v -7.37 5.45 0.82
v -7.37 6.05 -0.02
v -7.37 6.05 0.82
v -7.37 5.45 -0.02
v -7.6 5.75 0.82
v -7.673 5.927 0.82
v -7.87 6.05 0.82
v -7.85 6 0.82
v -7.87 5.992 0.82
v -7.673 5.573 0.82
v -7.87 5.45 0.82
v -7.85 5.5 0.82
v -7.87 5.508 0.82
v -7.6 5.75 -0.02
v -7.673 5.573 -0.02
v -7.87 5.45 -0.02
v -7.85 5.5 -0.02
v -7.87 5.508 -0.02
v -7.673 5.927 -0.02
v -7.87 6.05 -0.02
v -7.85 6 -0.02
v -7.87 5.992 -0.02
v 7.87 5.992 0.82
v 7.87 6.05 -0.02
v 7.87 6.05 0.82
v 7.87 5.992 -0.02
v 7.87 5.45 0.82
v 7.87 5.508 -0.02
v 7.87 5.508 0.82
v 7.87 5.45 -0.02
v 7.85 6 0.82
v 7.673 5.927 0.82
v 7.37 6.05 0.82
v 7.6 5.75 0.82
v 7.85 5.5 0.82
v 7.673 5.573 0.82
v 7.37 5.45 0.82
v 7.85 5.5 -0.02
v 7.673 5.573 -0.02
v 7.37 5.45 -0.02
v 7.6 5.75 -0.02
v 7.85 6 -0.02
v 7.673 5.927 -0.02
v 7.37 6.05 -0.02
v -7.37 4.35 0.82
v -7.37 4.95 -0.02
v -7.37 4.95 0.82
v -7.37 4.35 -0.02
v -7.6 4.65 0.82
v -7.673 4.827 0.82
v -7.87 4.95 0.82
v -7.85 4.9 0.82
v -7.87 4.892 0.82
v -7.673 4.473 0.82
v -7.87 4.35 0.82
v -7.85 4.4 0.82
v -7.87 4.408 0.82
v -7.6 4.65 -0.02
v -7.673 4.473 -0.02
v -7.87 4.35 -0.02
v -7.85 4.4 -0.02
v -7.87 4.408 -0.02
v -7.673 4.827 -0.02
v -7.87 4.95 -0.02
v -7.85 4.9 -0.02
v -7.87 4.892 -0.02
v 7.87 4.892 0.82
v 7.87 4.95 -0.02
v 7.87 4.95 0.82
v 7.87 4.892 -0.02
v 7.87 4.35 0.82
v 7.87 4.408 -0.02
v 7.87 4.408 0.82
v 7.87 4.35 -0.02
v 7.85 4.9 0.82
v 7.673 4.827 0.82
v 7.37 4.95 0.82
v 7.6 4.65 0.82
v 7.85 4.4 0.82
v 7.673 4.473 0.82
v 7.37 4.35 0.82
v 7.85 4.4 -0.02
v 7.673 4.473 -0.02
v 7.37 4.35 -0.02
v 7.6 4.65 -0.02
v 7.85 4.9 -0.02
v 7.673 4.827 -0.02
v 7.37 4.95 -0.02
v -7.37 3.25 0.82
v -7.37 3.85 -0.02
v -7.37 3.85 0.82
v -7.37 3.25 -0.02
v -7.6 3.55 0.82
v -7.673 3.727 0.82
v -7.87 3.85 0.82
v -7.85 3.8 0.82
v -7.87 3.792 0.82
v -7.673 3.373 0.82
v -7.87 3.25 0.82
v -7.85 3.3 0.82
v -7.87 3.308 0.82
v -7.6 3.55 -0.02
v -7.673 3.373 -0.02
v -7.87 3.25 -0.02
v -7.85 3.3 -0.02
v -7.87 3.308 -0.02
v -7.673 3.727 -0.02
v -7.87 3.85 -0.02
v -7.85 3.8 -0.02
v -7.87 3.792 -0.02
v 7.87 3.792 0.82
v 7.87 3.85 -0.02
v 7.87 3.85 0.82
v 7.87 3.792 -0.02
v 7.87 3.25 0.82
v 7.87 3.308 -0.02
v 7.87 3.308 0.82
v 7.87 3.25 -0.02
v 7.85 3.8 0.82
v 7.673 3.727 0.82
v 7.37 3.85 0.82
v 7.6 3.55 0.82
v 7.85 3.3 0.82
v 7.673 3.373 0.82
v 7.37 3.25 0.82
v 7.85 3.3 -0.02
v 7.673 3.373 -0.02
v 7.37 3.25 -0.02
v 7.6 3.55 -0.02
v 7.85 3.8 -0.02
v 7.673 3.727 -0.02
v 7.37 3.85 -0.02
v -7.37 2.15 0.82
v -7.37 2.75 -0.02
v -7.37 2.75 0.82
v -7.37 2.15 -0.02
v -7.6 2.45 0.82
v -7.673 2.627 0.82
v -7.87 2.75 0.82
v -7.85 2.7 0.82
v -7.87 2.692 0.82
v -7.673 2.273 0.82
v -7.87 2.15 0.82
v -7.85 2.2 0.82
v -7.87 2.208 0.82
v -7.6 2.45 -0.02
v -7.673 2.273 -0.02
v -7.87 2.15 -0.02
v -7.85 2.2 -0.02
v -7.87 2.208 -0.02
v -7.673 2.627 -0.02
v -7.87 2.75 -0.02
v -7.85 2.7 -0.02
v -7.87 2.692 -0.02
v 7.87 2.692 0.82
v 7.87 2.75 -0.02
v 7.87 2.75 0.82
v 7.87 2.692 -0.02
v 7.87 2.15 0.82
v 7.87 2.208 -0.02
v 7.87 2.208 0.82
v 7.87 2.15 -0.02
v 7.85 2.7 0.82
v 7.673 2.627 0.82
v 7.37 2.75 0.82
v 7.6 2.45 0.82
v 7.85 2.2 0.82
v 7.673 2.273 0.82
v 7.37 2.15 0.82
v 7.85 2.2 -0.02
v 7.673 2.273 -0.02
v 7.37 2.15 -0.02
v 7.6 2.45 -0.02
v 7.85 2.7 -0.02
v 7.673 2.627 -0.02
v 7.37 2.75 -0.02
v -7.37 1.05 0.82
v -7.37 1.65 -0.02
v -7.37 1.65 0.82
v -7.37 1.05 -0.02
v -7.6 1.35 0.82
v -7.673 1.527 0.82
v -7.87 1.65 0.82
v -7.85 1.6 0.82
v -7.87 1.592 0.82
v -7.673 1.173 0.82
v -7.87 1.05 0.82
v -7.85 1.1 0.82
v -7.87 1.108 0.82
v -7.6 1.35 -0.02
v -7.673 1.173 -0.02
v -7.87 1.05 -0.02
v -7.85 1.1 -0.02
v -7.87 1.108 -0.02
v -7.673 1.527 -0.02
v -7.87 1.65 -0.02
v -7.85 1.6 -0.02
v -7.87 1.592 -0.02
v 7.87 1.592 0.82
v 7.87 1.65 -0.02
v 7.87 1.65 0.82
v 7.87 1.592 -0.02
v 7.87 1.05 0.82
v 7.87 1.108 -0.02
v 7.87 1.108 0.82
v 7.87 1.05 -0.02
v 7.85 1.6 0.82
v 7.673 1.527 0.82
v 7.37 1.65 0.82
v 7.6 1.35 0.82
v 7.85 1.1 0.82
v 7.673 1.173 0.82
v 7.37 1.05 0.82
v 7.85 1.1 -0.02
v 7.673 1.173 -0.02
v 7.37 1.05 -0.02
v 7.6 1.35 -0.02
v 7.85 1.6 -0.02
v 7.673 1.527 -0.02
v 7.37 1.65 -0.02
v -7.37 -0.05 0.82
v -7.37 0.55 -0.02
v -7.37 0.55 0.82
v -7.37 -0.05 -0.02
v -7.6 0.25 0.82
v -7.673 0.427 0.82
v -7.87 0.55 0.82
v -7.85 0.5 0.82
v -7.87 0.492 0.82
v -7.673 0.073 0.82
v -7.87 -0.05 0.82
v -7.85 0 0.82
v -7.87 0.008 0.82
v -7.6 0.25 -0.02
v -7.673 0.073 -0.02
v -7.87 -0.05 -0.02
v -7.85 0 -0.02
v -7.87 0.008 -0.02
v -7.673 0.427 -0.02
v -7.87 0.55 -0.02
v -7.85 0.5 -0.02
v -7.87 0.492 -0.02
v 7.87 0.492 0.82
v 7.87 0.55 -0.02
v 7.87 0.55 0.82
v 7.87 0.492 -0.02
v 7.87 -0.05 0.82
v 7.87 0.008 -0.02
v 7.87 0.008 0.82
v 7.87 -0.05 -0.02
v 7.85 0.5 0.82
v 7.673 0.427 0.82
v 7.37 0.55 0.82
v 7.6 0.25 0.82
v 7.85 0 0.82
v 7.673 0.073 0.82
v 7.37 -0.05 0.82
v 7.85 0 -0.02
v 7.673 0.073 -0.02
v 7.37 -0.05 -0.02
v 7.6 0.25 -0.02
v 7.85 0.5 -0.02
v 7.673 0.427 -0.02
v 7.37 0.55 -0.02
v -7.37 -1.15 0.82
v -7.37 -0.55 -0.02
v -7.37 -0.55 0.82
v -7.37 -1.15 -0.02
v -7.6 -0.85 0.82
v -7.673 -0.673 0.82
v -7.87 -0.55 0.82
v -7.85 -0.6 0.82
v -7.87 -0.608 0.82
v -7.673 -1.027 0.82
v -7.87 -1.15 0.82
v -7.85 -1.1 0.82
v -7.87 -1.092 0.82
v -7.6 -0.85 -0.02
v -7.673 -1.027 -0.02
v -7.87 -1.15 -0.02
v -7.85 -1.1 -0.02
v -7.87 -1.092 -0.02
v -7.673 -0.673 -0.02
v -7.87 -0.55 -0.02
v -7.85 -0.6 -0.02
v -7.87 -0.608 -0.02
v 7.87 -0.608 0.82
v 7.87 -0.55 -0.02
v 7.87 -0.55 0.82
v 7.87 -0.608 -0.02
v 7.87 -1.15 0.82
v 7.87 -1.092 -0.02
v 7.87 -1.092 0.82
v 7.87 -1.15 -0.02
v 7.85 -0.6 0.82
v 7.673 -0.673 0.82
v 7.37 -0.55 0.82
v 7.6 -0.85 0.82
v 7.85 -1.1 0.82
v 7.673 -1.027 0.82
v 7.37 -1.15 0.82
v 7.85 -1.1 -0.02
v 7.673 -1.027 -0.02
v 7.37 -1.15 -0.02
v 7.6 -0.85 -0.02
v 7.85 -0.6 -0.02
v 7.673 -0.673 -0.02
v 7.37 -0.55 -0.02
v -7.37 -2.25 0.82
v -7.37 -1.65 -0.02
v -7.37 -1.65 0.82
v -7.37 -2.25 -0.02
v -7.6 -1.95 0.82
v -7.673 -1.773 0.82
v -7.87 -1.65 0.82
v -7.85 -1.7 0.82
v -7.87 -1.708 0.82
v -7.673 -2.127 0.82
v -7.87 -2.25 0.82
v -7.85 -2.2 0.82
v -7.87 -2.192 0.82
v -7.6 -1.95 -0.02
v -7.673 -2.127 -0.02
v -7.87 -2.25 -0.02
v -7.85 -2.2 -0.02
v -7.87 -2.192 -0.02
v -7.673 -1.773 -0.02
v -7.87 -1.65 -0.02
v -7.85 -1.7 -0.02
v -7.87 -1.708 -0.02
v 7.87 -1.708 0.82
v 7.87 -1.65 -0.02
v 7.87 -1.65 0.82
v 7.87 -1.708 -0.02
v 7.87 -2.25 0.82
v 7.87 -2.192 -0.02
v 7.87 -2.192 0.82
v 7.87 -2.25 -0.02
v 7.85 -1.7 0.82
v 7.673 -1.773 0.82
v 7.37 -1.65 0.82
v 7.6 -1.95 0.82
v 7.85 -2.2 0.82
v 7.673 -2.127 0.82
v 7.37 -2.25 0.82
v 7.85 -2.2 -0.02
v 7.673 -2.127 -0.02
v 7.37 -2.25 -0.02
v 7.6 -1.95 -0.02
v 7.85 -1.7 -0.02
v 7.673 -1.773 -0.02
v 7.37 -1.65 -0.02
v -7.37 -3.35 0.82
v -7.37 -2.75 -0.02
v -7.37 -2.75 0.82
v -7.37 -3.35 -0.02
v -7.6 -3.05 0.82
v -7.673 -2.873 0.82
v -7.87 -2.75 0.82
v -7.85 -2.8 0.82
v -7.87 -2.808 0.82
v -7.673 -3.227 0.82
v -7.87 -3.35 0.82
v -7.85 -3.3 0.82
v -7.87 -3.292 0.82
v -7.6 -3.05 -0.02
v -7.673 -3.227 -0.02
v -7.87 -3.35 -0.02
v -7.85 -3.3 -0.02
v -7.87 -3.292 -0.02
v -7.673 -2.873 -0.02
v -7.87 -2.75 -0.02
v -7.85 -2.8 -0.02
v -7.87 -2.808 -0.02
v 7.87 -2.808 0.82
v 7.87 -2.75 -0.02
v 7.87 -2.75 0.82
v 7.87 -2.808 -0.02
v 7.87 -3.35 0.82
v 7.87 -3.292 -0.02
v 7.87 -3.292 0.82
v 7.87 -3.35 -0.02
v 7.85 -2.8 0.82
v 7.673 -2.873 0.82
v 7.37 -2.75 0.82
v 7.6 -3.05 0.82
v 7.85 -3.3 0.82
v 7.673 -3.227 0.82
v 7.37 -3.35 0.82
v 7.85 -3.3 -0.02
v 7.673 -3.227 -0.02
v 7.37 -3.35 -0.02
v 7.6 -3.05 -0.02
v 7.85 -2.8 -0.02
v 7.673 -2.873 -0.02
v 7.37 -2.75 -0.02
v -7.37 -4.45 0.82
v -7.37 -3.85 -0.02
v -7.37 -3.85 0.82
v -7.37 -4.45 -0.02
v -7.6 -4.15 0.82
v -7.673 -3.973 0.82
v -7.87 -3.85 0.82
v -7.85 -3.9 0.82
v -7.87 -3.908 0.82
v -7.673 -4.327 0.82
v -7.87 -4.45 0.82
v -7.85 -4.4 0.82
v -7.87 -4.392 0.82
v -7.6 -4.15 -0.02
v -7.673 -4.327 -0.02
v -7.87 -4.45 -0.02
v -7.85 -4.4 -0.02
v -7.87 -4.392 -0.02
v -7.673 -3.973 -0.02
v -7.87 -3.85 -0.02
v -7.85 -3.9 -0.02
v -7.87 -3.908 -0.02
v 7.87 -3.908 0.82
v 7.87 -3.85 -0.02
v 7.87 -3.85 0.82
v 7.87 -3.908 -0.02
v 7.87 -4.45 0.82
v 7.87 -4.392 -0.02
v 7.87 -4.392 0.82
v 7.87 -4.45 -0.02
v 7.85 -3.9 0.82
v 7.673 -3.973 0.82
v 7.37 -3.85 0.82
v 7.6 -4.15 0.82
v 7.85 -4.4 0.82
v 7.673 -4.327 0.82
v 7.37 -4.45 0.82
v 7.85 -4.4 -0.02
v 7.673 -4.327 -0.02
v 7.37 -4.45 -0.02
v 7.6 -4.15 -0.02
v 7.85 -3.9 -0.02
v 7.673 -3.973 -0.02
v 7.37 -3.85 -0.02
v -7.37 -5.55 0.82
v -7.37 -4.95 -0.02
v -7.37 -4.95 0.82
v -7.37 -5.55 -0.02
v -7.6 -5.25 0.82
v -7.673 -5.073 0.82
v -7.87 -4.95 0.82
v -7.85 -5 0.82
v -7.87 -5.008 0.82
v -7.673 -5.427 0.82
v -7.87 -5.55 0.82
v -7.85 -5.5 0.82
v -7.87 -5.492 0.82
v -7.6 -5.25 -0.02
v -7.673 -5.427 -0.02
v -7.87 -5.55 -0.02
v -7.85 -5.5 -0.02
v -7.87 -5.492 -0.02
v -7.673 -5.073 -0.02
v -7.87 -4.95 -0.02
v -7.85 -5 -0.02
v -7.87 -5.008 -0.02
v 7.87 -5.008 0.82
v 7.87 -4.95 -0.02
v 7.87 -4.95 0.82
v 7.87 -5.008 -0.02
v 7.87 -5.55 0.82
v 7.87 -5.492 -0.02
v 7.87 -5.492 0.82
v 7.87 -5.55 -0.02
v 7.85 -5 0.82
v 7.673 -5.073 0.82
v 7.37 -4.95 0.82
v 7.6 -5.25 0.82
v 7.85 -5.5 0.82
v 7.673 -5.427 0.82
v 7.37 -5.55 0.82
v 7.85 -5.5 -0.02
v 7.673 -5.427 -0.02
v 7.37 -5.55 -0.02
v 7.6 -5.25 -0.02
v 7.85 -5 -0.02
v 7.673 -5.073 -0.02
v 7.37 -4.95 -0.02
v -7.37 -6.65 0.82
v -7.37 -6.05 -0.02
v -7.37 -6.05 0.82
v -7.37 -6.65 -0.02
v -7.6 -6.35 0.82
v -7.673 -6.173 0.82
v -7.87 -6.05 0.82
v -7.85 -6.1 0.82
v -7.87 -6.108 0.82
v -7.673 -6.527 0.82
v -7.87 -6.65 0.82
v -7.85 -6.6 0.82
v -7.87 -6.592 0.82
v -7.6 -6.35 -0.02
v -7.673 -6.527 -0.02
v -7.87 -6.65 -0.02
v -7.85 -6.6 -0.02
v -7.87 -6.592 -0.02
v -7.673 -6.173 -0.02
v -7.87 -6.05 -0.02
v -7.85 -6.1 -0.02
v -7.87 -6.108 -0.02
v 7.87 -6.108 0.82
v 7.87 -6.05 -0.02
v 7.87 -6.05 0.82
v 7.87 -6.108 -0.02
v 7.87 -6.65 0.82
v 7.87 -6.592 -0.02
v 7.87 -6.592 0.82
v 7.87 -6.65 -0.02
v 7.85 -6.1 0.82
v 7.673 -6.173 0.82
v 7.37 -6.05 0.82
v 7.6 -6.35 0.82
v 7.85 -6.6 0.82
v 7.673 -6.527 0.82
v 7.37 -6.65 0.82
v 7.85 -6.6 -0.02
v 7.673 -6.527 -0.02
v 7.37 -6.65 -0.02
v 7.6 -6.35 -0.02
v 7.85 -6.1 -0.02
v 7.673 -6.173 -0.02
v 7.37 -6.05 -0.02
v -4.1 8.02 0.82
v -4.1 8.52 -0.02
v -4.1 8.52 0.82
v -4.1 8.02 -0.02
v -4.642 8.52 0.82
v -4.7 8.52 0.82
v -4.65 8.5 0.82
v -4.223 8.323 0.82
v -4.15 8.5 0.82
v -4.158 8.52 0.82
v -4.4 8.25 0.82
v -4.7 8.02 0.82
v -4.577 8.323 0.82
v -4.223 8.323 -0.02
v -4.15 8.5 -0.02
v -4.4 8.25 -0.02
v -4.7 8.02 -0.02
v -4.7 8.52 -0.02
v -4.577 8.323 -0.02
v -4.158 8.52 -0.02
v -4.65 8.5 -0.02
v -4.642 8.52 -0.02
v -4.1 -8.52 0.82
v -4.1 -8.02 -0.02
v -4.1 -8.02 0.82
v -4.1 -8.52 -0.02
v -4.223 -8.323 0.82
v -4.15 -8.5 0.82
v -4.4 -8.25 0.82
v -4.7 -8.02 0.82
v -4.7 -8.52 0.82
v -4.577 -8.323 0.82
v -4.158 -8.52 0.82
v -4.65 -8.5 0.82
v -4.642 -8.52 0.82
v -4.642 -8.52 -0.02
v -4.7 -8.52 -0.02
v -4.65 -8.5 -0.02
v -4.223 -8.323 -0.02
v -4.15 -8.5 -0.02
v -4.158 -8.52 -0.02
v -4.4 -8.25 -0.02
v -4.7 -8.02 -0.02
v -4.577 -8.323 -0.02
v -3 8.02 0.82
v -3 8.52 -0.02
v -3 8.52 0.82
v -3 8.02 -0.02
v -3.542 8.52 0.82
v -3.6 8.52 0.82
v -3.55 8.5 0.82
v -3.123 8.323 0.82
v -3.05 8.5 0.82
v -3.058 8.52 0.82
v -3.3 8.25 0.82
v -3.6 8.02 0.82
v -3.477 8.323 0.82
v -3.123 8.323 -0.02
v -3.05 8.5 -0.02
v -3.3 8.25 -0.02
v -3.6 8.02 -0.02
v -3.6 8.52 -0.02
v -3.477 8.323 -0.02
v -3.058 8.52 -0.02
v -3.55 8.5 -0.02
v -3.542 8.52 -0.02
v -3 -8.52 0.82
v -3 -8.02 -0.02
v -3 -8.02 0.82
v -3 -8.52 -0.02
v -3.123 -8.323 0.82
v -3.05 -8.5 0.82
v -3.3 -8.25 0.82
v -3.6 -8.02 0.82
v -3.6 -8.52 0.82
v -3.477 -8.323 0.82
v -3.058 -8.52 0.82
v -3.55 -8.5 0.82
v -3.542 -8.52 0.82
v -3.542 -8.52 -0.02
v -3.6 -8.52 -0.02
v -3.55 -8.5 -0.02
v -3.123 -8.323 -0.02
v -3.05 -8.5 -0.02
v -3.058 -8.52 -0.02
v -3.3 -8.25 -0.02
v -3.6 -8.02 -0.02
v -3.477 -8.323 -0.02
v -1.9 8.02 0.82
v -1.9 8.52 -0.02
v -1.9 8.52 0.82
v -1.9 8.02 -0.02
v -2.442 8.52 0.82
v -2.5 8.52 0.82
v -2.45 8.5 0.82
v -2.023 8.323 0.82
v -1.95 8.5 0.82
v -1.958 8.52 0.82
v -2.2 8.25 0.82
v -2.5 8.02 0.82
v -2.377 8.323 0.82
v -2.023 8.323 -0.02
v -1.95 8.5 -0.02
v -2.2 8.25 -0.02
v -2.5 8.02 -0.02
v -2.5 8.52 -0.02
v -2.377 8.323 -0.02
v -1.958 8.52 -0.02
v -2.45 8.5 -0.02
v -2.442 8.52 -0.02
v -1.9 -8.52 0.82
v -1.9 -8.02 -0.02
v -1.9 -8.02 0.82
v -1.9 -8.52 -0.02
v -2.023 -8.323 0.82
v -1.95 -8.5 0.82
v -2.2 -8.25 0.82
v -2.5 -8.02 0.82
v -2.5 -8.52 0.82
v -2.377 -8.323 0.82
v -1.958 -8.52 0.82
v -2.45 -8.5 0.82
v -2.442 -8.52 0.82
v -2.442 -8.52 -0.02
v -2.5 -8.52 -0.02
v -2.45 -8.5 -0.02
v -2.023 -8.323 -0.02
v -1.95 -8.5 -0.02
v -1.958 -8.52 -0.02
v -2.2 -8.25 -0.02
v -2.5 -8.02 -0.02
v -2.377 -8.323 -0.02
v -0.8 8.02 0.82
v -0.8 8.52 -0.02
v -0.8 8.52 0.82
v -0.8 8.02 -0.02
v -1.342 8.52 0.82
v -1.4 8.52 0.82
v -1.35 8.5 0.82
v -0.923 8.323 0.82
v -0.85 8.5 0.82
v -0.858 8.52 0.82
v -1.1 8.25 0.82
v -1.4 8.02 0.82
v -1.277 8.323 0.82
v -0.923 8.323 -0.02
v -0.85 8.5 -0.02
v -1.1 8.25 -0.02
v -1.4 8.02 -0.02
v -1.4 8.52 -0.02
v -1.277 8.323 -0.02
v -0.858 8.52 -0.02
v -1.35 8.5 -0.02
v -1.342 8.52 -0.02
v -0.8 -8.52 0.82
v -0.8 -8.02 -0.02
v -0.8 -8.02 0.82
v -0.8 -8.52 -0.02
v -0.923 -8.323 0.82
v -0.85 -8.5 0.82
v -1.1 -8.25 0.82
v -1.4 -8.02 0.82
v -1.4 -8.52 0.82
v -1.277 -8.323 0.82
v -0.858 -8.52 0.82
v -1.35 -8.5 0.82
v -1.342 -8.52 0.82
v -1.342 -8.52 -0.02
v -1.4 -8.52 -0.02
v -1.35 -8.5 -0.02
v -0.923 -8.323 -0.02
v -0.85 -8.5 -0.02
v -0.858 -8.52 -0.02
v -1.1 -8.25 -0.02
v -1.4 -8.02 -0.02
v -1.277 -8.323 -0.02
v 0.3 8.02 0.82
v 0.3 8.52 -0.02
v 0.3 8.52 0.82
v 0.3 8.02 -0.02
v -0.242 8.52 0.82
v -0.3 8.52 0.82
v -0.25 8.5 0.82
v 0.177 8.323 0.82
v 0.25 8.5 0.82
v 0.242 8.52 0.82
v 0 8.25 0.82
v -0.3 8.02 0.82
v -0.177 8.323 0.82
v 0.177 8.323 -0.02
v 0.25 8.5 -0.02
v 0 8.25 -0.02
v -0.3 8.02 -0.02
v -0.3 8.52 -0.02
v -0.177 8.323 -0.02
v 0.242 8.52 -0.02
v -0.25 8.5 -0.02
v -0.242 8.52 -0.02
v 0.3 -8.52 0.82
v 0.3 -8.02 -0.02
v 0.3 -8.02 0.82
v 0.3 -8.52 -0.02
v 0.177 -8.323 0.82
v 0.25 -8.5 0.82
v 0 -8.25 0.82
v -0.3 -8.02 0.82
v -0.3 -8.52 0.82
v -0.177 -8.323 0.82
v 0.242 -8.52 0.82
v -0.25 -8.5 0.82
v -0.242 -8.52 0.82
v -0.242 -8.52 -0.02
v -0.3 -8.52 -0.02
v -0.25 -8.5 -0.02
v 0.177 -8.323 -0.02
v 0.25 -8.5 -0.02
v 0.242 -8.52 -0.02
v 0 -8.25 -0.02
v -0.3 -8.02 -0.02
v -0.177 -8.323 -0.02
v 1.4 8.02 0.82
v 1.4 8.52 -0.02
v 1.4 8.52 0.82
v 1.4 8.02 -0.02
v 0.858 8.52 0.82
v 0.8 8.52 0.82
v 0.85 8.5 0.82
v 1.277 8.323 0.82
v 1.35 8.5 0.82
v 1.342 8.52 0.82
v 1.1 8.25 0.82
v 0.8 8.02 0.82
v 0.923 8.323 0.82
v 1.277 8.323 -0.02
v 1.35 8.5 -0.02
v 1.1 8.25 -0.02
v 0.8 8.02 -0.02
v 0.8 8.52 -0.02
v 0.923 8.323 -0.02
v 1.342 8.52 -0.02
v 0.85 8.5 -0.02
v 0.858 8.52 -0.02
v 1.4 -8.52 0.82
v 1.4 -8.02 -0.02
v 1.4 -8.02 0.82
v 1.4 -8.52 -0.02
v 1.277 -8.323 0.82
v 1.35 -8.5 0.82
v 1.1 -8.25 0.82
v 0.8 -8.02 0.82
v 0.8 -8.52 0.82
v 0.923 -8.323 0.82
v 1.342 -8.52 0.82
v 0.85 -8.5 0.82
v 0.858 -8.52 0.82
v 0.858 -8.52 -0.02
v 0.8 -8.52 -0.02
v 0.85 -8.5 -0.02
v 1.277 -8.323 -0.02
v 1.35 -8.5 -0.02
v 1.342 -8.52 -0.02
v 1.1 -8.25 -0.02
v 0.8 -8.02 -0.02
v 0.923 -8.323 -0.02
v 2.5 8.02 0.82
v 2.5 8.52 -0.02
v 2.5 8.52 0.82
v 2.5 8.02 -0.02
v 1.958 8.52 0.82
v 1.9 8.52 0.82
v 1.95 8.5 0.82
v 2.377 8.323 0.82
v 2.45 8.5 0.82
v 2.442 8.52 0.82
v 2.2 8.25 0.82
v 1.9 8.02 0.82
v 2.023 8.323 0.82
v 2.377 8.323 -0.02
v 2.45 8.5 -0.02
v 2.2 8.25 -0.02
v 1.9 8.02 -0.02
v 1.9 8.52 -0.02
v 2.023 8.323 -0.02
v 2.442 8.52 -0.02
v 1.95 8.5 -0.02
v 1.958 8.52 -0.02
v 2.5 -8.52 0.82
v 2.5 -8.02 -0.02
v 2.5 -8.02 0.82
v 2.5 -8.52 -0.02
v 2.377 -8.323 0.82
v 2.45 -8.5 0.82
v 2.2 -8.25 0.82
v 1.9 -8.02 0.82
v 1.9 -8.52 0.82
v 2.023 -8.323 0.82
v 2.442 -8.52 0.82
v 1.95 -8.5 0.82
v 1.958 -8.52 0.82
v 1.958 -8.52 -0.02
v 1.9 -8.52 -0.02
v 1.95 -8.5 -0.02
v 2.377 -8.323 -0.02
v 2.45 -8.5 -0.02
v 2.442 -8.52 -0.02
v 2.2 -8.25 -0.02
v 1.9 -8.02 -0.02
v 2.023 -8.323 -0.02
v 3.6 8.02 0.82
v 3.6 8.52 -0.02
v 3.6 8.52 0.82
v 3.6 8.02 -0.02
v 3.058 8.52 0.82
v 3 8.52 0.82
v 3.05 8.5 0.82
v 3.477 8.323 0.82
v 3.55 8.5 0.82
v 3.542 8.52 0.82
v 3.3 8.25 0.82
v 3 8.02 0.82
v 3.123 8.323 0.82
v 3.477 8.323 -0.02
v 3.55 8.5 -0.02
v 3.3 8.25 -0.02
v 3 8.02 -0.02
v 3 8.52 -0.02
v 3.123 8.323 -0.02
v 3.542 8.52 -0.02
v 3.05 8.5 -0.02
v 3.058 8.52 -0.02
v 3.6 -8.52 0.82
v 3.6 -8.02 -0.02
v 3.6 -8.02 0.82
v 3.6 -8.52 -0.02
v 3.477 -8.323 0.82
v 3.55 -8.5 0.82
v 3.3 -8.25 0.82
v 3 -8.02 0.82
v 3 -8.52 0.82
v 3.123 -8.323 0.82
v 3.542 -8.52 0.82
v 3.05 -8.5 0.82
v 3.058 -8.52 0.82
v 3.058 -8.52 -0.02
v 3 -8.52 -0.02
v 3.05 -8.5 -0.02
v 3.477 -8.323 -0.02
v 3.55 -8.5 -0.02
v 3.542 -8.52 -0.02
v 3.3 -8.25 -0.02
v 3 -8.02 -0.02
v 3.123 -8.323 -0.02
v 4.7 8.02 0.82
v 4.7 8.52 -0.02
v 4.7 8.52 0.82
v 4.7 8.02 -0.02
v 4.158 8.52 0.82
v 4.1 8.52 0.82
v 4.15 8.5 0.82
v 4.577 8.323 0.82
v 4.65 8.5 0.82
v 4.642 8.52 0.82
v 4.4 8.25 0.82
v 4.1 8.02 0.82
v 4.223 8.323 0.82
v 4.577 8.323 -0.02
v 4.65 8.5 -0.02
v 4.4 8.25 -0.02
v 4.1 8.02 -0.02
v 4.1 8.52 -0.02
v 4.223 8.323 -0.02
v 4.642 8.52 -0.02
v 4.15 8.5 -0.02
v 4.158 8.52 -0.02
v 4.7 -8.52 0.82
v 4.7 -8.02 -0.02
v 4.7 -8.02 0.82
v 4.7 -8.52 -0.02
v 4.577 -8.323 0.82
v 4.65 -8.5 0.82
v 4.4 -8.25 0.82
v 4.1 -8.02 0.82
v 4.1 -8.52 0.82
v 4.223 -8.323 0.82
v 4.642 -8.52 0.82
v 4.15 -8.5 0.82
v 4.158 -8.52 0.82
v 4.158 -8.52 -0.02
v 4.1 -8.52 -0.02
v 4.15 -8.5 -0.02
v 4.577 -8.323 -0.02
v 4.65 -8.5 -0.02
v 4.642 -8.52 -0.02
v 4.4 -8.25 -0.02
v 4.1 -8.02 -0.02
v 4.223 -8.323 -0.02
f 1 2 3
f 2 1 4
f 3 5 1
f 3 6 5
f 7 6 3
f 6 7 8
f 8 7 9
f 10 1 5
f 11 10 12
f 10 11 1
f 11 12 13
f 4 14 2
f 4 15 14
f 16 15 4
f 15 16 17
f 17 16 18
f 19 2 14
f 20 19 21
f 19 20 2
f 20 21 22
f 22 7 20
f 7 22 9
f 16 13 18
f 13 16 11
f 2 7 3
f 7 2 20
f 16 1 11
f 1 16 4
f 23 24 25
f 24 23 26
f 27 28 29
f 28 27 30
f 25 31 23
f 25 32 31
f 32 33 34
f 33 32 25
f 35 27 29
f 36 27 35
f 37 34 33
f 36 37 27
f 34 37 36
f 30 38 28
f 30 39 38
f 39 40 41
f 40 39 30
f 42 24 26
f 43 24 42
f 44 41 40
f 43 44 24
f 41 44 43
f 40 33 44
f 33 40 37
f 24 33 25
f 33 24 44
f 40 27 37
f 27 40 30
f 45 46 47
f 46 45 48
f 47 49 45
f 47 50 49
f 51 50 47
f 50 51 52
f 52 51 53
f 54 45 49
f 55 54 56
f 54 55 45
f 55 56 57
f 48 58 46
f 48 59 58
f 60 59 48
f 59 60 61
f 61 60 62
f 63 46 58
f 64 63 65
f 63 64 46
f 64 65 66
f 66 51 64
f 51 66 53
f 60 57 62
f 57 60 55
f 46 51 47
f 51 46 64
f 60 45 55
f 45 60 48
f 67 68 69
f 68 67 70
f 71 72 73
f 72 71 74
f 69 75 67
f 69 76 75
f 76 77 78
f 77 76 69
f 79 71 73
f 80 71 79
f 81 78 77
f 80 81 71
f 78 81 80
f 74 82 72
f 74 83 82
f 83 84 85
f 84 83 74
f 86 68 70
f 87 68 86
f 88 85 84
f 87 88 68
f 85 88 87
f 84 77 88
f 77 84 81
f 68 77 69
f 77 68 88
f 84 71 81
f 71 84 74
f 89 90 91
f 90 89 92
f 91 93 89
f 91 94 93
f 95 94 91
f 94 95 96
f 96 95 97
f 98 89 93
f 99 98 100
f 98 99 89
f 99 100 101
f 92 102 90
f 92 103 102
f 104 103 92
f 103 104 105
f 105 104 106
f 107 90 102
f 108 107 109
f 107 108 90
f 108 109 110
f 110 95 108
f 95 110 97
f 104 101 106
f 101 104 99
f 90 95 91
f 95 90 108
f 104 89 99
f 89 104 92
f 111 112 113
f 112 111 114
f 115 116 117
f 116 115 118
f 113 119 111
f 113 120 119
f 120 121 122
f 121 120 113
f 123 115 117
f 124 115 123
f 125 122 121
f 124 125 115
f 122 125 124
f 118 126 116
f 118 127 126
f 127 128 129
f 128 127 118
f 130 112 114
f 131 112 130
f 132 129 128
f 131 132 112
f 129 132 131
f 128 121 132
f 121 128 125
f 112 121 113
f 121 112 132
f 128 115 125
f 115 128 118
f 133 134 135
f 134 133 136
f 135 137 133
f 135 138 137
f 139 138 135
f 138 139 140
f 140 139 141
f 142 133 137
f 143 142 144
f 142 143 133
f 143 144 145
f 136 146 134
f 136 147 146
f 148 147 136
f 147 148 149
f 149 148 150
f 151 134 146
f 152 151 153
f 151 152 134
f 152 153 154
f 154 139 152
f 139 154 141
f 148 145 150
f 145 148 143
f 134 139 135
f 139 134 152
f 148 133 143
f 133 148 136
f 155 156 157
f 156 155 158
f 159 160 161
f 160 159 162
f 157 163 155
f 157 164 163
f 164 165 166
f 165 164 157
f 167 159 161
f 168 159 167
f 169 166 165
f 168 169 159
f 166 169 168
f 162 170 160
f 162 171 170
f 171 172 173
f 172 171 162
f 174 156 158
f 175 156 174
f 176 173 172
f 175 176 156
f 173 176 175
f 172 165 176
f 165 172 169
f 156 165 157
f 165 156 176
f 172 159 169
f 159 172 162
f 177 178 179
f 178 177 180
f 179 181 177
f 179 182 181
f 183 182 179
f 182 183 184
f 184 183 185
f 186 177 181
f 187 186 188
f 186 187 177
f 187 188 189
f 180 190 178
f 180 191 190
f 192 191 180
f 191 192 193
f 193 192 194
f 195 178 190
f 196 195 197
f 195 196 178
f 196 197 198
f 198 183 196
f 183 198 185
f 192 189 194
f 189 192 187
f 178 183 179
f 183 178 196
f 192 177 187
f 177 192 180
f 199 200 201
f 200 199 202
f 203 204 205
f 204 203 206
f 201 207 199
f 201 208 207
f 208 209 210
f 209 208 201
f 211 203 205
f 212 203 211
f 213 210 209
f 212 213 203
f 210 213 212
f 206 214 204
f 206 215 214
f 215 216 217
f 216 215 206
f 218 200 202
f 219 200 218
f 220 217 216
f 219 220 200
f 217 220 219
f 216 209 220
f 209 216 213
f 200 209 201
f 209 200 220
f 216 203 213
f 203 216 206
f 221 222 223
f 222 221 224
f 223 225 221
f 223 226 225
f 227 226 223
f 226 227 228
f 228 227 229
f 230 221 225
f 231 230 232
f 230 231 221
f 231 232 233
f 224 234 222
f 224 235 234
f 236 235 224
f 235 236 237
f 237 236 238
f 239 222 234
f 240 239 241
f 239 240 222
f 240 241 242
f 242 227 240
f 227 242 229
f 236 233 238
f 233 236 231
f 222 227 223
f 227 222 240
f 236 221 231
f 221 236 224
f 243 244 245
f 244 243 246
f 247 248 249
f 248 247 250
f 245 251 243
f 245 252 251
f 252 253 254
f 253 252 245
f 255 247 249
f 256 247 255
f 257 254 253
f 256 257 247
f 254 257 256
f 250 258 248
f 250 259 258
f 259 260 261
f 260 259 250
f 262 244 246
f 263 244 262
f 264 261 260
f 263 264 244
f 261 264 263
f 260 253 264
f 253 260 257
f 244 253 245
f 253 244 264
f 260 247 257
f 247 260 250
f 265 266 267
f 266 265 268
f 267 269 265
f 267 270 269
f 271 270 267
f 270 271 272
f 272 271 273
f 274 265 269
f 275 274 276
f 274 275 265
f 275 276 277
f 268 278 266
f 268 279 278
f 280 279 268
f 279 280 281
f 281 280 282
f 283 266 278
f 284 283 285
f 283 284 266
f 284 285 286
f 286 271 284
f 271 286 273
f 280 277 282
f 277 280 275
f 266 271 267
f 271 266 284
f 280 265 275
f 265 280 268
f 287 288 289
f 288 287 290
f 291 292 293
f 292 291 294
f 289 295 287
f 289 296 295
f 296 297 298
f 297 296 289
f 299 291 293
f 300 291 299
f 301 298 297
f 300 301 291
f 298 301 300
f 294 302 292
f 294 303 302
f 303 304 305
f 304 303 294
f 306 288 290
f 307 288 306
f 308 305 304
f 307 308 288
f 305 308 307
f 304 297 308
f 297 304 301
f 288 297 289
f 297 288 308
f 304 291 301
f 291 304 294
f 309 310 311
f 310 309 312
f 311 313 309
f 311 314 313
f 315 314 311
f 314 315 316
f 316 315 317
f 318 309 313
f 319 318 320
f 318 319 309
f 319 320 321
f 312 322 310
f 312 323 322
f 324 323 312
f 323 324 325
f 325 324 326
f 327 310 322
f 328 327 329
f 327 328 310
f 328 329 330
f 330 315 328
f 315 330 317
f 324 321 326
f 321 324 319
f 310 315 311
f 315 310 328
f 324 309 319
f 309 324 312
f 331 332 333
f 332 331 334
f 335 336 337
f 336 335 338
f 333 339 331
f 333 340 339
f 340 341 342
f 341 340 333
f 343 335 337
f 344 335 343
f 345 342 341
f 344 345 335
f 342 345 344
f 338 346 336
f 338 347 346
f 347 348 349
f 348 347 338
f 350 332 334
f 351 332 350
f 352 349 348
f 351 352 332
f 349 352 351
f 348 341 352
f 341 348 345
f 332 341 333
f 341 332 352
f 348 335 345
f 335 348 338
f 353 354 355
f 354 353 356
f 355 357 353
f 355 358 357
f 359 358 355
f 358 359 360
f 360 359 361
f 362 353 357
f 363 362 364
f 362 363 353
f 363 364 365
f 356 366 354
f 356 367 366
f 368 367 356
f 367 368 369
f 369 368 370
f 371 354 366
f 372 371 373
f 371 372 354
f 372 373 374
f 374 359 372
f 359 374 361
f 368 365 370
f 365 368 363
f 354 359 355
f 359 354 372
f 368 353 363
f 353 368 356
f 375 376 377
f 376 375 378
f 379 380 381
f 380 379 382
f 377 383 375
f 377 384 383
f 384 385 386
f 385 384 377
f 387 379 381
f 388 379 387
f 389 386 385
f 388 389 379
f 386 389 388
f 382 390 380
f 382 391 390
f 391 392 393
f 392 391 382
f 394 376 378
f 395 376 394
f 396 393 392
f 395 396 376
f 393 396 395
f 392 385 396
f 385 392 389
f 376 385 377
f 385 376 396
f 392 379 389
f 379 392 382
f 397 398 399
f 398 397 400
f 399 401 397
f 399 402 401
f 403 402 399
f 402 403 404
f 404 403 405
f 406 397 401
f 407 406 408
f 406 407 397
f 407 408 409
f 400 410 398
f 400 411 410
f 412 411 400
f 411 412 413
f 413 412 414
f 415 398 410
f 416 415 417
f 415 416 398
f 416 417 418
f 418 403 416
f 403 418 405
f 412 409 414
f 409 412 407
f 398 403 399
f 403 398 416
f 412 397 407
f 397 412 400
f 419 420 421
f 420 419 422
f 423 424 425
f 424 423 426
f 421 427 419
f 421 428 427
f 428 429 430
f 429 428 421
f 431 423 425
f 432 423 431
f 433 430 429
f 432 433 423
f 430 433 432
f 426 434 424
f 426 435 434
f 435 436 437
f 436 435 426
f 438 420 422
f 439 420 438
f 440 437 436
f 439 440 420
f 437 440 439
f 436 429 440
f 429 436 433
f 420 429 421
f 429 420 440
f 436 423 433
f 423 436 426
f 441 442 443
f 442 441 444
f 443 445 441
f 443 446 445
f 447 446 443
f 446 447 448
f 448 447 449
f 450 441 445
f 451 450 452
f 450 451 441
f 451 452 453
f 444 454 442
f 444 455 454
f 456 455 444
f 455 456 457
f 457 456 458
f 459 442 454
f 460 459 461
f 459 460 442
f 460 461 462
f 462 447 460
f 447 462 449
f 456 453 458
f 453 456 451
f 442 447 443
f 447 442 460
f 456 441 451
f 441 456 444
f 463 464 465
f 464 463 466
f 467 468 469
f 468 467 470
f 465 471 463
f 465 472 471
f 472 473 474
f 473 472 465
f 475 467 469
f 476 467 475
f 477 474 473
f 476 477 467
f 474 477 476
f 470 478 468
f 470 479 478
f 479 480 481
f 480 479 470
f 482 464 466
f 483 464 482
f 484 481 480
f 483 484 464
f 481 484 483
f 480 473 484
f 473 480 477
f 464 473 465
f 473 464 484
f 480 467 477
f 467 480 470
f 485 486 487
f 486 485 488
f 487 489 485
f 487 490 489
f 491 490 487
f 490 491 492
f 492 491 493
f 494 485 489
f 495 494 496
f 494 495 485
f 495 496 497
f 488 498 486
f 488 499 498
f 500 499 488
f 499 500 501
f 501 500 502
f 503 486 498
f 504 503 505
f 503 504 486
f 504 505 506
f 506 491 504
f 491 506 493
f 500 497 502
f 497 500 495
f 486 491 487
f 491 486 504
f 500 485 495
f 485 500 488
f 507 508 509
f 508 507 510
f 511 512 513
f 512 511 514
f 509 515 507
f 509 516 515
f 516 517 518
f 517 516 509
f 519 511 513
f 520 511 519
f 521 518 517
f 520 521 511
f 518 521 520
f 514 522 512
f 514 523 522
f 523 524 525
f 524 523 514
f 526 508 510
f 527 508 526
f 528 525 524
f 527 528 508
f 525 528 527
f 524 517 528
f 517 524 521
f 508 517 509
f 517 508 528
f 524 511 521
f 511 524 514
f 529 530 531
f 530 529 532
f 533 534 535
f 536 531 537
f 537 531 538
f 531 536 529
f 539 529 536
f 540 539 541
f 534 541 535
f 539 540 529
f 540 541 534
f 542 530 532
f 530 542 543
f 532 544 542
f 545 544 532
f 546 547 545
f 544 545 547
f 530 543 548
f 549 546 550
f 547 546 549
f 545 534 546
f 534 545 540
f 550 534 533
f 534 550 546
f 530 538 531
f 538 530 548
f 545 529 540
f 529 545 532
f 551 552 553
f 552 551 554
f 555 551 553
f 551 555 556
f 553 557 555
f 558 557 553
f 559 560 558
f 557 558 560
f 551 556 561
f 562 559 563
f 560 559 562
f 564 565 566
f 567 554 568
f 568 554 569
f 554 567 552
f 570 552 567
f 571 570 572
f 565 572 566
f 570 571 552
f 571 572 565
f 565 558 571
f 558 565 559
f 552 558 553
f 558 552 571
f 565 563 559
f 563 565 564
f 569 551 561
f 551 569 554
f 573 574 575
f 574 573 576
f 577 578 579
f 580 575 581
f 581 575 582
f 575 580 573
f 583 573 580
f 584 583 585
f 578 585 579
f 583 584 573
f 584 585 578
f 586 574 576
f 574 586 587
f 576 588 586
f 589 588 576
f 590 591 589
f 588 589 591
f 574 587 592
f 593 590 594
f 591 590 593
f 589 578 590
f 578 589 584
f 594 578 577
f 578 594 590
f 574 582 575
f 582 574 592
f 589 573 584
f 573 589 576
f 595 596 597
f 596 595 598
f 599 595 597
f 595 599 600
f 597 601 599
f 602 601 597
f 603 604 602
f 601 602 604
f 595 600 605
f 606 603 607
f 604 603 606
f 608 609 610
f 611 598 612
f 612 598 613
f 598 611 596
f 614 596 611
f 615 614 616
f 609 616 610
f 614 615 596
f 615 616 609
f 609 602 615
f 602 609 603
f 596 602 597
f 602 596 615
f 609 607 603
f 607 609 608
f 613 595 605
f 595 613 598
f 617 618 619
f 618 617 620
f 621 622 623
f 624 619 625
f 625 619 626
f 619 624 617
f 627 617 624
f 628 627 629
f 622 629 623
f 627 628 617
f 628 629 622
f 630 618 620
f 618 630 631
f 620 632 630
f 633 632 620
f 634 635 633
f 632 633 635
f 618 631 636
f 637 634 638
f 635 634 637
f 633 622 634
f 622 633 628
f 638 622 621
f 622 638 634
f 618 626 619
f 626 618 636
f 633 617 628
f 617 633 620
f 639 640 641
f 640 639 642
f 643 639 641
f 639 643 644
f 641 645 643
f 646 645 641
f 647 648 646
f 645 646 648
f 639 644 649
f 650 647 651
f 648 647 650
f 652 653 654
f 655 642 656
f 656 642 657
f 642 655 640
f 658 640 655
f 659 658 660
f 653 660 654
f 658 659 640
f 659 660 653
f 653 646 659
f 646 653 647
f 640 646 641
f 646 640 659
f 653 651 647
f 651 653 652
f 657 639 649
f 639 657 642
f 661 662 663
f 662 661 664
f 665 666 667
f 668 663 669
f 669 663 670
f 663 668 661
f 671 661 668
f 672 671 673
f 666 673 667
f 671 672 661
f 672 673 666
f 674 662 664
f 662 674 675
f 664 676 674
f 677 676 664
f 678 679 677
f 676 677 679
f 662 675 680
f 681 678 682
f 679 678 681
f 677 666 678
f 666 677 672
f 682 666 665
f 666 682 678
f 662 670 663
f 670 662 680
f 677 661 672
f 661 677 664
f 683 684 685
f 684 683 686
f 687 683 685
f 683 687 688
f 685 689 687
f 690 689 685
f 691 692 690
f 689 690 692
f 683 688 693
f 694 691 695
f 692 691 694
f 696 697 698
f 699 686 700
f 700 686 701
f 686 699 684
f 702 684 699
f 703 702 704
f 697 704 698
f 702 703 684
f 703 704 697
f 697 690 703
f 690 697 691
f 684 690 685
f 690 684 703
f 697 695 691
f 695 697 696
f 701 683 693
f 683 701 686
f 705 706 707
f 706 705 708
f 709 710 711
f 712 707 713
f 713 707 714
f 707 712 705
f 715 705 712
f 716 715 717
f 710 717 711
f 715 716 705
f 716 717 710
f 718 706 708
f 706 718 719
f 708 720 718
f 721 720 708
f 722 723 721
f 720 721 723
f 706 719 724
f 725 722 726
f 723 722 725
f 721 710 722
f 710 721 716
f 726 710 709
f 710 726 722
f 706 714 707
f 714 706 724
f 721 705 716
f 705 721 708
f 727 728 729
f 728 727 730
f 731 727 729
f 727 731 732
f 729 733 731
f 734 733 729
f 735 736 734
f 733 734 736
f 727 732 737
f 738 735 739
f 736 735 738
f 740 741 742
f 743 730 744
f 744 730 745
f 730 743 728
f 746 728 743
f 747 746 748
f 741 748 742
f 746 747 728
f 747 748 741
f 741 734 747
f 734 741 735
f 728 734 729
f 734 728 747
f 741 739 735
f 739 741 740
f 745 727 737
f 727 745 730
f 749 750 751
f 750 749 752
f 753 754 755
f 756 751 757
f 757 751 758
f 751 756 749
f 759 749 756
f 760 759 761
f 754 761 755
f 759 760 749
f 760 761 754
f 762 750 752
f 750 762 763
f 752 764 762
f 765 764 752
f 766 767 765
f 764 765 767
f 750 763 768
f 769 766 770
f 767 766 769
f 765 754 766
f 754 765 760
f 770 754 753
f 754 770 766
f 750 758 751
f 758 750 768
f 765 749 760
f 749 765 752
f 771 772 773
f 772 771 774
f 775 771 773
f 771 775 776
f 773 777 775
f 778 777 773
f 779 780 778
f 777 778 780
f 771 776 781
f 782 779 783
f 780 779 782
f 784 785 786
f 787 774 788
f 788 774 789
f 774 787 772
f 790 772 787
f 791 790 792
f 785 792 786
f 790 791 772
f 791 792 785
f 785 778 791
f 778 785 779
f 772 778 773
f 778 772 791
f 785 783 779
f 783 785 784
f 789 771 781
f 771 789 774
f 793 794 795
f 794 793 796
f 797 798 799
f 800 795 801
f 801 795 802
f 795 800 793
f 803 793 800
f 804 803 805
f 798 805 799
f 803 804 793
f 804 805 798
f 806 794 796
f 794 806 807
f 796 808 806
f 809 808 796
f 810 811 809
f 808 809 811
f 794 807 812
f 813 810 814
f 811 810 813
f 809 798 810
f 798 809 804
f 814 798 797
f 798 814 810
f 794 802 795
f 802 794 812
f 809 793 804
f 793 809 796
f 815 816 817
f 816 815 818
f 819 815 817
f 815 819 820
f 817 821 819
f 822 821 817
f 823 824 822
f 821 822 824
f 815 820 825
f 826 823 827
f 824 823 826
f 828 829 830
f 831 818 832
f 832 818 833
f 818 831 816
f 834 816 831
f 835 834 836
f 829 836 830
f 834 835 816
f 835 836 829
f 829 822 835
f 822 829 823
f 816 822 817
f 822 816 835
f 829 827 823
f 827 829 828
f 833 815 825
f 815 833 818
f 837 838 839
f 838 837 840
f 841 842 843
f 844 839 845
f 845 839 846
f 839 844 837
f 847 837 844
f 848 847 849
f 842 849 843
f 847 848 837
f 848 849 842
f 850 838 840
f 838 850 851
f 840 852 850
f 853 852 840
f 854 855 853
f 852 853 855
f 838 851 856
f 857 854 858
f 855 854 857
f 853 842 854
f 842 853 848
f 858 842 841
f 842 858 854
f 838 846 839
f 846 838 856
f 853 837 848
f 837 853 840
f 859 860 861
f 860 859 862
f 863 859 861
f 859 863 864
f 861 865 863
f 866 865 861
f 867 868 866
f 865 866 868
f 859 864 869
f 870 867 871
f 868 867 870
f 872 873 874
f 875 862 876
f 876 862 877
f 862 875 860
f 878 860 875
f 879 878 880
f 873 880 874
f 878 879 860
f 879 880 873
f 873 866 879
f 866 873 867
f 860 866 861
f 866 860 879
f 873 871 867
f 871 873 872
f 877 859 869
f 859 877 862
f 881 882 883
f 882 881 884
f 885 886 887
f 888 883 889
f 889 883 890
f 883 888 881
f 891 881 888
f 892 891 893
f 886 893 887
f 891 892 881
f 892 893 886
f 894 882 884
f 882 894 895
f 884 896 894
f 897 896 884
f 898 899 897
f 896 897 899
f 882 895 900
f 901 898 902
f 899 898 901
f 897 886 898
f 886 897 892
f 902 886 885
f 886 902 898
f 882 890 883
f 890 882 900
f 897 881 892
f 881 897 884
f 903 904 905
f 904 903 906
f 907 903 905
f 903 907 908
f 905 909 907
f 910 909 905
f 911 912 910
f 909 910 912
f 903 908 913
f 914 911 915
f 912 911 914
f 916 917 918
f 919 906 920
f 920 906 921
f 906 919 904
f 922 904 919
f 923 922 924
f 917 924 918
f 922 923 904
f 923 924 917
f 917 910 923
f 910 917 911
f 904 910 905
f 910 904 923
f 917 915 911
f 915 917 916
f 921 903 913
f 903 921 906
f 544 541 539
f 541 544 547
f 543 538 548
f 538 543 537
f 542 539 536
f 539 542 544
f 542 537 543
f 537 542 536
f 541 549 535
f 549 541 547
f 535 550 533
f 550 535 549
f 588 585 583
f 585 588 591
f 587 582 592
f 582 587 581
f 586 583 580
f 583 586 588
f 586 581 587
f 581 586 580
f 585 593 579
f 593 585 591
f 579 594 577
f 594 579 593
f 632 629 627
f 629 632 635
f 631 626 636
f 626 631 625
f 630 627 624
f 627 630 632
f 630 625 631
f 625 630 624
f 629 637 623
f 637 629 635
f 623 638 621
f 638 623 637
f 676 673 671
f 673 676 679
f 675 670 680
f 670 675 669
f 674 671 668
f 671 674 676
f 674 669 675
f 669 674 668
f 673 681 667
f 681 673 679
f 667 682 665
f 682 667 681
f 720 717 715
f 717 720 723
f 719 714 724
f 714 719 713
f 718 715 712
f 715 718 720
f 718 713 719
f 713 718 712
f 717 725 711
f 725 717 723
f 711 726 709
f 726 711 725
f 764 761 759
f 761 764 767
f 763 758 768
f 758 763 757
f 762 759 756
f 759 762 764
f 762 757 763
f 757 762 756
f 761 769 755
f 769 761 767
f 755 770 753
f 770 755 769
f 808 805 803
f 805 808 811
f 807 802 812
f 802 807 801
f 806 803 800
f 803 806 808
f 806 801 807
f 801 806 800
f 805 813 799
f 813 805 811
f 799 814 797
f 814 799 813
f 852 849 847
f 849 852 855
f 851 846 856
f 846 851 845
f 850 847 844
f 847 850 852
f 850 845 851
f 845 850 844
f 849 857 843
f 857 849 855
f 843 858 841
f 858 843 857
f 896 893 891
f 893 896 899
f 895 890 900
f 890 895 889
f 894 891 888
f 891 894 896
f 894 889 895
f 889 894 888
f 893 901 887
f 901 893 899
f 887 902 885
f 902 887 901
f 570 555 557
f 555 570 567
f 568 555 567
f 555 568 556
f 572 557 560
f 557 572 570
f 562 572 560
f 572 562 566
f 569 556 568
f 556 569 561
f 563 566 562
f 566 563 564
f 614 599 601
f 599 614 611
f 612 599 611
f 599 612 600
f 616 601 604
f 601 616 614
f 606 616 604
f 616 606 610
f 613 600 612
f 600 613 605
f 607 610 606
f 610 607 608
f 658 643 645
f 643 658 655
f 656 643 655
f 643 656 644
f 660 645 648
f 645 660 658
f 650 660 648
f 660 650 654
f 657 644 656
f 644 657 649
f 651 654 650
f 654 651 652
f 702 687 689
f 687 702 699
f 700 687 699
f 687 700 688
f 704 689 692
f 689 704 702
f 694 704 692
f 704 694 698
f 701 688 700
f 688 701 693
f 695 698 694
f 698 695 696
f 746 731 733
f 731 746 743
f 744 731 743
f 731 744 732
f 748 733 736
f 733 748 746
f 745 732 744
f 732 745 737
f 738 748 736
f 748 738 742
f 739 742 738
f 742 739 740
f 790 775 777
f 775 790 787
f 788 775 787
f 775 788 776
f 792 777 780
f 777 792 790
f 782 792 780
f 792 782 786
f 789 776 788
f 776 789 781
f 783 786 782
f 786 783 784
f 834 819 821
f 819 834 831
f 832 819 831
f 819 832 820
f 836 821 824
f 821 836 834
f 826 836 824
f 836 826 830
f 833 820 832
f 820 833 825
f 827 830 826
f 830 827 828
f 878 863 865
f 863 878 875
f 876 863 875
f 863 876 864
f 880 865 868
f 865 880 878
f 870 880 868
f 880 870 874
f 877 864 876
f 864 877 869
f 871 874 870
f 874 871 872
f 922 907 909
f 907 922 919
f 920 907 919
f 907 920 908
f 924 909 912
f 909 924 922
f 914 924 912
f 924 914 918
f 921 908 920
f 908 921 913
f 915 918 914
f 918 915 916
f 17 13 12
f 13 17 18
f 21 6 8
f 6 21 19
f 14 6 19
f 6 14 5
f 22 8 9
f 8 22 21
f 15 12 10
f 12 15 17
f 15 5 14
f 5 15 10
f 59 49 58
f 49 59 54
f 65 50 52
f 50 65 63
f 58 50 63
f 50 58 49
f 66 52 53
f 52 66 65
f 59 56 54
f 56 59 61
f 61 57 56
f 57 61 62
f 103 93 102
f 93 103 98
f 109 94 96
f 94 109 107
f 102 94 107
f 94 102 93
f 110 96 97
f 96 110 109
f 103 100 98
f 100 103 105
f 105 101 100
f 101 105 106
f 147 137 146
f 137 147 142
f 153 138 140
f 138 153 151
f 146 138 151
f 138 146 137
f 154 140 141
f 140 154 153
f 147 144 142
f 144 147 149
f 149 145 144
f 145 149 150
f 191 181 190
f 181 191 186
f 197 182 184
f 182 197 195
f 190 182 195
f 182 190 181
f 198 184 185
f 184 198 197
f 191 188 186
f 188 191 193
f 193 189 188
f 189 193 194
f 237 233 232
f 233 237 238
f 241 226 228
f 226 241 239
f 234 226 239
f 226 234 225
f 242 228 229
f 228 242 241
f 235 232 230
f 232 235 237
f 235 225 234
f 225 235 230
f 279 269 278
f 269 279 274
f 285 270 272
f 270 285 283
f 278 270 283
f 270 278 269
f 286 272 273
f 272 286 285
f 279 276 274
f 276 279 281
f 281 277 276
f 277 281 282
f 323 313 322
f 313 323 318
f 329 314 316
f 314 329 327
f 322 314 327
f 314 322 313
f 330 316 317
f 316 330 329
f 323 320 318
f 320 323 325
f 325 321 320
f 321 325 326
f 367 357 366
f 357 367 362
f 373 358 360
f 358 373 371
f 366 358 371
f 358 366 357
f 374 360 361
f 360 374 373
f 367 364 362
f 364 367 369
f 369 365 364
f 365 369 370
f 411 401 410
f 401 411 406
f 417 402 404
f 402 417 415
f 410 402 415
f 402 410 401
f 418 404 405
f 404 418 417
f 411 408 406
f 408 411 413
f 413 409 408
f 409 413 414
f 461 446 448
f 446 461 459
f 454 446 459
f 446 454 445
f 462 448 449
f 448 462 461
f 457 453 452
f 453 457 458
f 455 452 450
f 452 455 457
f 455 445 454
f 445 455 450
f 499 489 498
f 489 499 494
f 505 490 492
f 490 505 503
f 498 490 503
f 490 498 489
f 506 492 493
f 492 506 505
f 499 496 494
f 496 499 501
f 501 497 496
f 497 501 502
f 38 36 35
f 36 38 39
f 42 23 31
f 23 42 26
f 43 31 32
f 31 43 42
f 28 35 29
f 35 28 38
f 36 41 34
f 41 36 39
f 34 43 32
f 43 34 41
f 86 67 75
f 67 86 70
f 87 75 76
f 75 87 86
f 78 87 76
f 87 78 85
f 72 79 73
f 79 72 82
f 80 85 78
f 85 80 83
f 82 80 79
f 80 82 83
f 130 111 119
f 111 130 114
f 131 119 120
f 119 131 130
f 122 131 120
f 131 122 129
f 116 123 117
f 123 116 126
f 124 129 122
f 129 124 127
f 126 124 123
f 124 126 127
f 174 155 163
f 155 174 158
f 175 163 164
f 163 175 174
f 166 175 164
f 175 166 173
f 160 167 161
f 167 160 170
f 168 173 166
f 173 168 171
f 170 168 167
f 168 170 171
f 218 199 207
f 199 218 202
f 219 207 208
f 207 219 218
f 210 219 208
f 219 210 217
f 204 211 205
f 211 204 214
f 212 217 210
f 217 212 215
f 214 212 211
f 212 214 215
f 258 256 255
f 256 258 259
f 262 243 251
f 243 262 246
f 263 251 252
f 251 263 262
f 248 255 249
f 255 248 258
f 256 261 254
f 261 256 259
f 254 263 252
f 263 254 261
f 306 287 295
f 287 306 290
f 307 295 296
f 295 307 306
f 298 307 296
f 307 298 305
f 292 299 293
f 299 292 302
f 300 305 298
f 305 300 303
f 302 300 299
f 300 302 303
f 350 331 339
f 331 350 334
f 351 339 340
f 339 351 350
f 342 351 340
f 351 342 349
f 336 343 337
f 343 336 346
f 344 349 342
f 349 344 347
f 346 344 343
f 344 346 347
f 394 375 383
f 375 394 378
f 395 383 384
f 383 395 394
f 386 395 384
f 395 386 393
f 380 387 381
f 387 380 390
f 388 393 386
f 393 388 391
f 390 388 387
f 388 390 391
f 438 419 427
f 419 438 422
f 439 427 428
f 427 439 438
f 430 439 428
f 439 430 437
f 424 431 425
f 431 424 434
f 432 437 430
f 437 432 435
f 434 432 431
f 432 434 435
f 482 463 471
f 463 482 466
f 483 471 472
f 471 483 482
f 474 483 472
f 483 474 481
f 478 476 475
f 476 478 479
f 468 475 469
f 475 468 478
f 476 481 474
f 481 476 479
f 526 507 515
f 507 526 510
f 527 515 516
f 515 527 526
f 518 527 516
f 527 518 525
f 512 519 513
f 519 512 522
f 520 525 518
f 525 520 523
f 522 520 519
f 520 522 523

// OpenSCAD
// file: defines.scad
// example012.stl is Mblock.stl, (c) 2009 Will Langford
// licensed under the Creative Commons - GNU GPL license.
// http://www.thingiverse.com/thing:753

//import("sim800c.stl", convexity=3);

// PCB

w = 15.7;
h = 17.0;
pin_fragments = 8;
// main file
// example012.stl is Mblock.stl, (c) 2009 Will Langford
// licensed under the Creative Commons - GNU GPL license.
// http://www.thingiverse.com/thing:753

//import("sim800c.stl", convexity=3);

// PCB

include <defines.scad>


// Pin pad

module PinPads() {
  color("Gold")
  for(i = [0 : 11]) {
    translate([-w/2-0.02, h/2 - 2.75 - 0.3 - i * 1.1, -0.02])
      cube(size = [0.5, 0.6, 0.84]);
    translate([ w/2+0.02-0.5, h/2 - 2.75 - 0.3 - i * 1.1, -0.02])
      cube(size = [0.5, 0.6, 0.84]);
  }
  for(i = [0 : 8]) {
    translate([-w/2+3.45-0.3 + i * 1.1,  h/2 + 0.02 - 0.5, -0.02])
      cube(size = [0.6, 0.5, 0.84]);
    translate([-w/2+3.45-0.3 + i * 1.1, -h/2 - 0.02, -0.02])
      cube(size = [0.6, 0.5, 0.84]);
  }
}

//PinPad(-w/2-0.02, h/2 - 2.75 - 0.3);

// Pin drill

module Pin(o_x, o_y, d_x, d_y, cnt) {
  color("Gold")
  for(i = [0 : cnt-1]) {
    translate([o_x + i * d_x, o_y + i * d_y, -0.5])
      cylinder(h = 2, r = 0.25, $fn = pin_fragments);
  }
}

module PinDrills() {
    Pin(-w/2 + 3.45,  h/2, 1.1, 0, 9);
    Pin(-w/2 + 3.45, -h/2, 1.1, 0, 9);

    Pin(-w/2, h/2 - 2.75, 0, -1.1, 12);
    Pin( w/2, h/2 - 2.75, 0, -1.1, 12);
}

// Combine together

difference() {
  union() {

      for(i = [0 : 11]) {
        translate([-w/2-0.02, h/2 - 2.75 - 0.3 - i * 1.1, -0.02])
          cube(size = [0.5, 0.6, 0.84]);
        translate([ w/2+0.02-0.5, h/2 - 2.75 - 0.3 - i * 1.1, -0.02])
          cube(size = [0.5, 0.6, 0.84]);
      }
      for(i = [0 : 8]) {
        translate([-w/2+3.45-0.3 + i * 1.1,  h/2 + 0.02 - 0.5, -0.02])
          cube(size = [0.6, 0.5, 0.84]);
        translate([-w/2+3.45-0.3 + i * 1.1, -h/2 - 0.02, -0.02])
          cube(size = [0.6, 0.5, 0.84]);
      }

  }
  PinDrills();
}
